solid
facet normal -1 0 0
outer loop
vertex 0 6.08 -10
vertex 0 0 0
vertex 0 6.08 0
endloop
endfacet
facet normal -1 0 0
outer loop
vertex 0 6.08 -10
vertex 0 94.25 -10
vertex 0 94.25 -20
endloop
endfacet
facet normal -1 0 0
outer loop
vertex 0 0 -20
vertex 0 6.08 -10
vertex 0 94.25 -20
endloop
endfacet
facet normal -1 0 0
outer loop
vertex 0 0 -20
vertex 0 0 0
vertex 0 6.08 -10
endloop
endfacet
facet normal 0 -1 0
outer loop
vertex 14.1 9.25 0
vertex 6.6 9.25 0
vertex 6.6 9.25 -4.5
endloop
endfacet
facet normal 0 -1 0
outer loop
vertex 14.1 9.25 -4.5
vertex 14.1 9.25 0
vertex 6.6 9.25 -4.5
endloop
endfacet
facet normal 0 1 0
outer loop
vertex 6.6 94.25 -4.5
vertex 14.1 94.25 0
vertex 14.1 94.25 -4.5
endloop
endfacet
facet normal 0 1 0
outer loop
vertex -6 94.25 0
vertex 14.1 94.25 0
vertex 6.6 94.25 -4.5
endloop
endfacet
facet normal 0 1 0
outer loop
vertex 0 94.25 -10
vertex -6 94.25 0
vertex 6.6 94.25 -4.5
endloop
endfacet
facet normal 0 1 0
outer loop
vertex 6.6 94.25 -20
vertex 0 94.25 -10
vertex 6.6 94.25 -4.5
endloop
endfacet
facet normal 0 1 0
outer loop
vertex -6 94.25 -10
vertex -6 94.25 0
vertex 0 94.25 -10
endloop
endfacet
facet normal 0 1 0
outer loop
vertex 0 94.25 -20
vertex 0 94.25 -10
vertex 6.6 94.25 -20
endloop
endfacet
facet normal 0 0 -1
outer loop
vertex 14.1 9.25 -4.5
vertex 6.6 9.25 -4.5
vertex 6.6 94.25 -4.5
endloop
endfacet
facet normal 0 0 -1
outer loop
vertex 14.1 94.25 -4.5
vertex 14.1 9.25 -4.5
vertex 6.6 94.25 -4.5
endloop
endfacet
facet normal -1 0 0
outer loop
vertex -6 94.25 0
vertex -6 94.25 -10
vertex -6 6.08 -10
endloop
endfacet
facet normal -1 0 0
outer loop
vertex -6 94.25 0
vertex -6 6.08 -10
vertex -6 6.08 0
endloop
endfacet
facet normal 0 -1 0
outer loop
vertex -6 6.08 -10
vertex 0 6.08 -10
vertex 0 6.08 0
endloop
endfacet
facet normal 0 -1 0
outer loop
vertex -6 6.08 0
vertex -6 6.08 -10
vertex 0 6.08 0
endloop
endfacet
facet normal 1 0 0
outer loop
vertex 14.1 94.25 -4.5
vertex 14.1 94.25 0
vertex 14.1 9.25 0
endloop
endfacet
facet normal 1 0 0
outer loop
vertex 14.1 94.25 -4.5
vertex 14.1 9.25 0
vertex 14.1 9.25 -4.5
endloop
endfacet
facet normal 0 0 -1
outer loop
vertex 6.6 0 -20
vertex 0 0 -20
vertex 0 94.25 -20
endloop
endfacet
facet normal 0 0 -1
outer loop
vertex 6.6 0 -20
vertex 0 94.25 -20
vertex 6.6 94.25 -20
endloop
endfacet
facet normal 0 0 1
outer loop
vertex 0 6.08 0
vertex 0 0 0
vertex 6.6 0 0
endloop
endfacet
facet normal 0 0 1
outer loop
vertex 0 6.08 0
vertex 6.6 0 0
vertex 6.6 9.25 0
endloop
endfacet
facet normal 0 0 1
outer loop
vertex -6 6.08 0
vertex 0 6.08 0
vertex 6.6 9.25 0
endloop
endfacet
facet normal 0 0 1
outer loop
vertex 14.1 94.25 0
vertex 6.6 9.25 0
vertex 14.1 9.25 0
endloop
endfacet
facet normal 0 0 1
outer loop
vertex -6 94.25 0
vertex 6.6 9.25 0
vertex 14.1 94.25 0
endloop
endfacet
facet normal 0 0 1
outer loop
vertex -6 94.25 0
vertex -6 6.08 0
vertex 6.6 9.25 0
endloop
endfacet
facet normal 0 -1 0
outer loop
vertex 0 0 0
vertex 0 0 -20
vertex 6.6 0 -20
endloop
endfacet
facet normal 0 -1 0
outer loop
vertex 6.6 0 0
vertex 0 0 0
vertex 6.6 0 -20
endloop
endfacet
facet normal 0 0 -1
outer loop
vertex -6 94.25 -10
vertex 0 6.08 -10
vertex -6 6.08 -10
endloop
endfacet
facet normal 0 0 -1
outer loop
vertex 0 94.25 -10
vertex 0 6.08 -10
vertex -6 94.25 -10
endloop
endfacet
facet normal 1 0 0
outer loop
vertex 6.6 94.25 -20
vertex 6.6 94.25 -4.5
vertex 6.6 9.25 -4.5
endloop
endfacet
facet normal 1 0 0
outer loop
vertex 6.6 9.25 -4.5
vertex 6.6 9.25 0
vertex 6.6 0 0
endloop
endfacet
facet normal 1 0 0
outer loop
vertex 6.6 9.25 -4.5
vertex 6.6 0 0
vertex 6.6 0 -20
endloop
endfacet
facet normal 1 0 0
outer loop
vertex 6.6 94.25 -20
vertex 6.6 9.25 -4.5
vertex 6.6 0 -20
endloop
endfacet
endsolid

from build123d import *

# Parameters (mm, degrees)
SKETCH1_W           = 6.6
SKETCH1_H           = 20
BOSS_EXTRUDE1_DEPTH = 94.25
SKETCH3_W           = 10
SKETCH3_H           = 88.17
BOSS_EXTRUDE2_DEPTH = 6
SKETCH4_W           = 4.5
SKETCH4_H           = 85
BOSS_EXTRUDE3_DEPTH = 7.5


with BuildPart() as part:
    # Sketch1 → Boss-Extrude1 (new body)
    with BuildSketch(Plane(origin=(0, 0, 0), x_dir=(1, 0, 0), z_dir=(0, 1, 0))):
        with Locations((3.3, 10)):
            Rectangle(SKETCH1_W, SKETCH1_H)
    extrude(amount=BOSS_EXTRUDE1_DEPTH)

    # Sketch3 → Boss-Extrude2 (add)
    with BuildSketch(Plane.ZY):
        with Locations((-5, 50.165)):
            Rectangle(SKETCH3_W, SKETCH3_H)
    extrude(amount=BOSS_EXTRUDE2_DEPTH)

    # Sketch4 → Boss-Extrude3 (add)
    with BuildSketch(Plane(origin=(6.6, 0, 0), x_dir=(0, 0, -1), z_dir=(1, 0, 0))):
        with Locations((2.25, 51.75)):
            Rectangle(SKETCH4_W, SKETCH4_H)
    extrude(amount=BOSS_EXTRUDE3_DEPTH)


solid = part.part
